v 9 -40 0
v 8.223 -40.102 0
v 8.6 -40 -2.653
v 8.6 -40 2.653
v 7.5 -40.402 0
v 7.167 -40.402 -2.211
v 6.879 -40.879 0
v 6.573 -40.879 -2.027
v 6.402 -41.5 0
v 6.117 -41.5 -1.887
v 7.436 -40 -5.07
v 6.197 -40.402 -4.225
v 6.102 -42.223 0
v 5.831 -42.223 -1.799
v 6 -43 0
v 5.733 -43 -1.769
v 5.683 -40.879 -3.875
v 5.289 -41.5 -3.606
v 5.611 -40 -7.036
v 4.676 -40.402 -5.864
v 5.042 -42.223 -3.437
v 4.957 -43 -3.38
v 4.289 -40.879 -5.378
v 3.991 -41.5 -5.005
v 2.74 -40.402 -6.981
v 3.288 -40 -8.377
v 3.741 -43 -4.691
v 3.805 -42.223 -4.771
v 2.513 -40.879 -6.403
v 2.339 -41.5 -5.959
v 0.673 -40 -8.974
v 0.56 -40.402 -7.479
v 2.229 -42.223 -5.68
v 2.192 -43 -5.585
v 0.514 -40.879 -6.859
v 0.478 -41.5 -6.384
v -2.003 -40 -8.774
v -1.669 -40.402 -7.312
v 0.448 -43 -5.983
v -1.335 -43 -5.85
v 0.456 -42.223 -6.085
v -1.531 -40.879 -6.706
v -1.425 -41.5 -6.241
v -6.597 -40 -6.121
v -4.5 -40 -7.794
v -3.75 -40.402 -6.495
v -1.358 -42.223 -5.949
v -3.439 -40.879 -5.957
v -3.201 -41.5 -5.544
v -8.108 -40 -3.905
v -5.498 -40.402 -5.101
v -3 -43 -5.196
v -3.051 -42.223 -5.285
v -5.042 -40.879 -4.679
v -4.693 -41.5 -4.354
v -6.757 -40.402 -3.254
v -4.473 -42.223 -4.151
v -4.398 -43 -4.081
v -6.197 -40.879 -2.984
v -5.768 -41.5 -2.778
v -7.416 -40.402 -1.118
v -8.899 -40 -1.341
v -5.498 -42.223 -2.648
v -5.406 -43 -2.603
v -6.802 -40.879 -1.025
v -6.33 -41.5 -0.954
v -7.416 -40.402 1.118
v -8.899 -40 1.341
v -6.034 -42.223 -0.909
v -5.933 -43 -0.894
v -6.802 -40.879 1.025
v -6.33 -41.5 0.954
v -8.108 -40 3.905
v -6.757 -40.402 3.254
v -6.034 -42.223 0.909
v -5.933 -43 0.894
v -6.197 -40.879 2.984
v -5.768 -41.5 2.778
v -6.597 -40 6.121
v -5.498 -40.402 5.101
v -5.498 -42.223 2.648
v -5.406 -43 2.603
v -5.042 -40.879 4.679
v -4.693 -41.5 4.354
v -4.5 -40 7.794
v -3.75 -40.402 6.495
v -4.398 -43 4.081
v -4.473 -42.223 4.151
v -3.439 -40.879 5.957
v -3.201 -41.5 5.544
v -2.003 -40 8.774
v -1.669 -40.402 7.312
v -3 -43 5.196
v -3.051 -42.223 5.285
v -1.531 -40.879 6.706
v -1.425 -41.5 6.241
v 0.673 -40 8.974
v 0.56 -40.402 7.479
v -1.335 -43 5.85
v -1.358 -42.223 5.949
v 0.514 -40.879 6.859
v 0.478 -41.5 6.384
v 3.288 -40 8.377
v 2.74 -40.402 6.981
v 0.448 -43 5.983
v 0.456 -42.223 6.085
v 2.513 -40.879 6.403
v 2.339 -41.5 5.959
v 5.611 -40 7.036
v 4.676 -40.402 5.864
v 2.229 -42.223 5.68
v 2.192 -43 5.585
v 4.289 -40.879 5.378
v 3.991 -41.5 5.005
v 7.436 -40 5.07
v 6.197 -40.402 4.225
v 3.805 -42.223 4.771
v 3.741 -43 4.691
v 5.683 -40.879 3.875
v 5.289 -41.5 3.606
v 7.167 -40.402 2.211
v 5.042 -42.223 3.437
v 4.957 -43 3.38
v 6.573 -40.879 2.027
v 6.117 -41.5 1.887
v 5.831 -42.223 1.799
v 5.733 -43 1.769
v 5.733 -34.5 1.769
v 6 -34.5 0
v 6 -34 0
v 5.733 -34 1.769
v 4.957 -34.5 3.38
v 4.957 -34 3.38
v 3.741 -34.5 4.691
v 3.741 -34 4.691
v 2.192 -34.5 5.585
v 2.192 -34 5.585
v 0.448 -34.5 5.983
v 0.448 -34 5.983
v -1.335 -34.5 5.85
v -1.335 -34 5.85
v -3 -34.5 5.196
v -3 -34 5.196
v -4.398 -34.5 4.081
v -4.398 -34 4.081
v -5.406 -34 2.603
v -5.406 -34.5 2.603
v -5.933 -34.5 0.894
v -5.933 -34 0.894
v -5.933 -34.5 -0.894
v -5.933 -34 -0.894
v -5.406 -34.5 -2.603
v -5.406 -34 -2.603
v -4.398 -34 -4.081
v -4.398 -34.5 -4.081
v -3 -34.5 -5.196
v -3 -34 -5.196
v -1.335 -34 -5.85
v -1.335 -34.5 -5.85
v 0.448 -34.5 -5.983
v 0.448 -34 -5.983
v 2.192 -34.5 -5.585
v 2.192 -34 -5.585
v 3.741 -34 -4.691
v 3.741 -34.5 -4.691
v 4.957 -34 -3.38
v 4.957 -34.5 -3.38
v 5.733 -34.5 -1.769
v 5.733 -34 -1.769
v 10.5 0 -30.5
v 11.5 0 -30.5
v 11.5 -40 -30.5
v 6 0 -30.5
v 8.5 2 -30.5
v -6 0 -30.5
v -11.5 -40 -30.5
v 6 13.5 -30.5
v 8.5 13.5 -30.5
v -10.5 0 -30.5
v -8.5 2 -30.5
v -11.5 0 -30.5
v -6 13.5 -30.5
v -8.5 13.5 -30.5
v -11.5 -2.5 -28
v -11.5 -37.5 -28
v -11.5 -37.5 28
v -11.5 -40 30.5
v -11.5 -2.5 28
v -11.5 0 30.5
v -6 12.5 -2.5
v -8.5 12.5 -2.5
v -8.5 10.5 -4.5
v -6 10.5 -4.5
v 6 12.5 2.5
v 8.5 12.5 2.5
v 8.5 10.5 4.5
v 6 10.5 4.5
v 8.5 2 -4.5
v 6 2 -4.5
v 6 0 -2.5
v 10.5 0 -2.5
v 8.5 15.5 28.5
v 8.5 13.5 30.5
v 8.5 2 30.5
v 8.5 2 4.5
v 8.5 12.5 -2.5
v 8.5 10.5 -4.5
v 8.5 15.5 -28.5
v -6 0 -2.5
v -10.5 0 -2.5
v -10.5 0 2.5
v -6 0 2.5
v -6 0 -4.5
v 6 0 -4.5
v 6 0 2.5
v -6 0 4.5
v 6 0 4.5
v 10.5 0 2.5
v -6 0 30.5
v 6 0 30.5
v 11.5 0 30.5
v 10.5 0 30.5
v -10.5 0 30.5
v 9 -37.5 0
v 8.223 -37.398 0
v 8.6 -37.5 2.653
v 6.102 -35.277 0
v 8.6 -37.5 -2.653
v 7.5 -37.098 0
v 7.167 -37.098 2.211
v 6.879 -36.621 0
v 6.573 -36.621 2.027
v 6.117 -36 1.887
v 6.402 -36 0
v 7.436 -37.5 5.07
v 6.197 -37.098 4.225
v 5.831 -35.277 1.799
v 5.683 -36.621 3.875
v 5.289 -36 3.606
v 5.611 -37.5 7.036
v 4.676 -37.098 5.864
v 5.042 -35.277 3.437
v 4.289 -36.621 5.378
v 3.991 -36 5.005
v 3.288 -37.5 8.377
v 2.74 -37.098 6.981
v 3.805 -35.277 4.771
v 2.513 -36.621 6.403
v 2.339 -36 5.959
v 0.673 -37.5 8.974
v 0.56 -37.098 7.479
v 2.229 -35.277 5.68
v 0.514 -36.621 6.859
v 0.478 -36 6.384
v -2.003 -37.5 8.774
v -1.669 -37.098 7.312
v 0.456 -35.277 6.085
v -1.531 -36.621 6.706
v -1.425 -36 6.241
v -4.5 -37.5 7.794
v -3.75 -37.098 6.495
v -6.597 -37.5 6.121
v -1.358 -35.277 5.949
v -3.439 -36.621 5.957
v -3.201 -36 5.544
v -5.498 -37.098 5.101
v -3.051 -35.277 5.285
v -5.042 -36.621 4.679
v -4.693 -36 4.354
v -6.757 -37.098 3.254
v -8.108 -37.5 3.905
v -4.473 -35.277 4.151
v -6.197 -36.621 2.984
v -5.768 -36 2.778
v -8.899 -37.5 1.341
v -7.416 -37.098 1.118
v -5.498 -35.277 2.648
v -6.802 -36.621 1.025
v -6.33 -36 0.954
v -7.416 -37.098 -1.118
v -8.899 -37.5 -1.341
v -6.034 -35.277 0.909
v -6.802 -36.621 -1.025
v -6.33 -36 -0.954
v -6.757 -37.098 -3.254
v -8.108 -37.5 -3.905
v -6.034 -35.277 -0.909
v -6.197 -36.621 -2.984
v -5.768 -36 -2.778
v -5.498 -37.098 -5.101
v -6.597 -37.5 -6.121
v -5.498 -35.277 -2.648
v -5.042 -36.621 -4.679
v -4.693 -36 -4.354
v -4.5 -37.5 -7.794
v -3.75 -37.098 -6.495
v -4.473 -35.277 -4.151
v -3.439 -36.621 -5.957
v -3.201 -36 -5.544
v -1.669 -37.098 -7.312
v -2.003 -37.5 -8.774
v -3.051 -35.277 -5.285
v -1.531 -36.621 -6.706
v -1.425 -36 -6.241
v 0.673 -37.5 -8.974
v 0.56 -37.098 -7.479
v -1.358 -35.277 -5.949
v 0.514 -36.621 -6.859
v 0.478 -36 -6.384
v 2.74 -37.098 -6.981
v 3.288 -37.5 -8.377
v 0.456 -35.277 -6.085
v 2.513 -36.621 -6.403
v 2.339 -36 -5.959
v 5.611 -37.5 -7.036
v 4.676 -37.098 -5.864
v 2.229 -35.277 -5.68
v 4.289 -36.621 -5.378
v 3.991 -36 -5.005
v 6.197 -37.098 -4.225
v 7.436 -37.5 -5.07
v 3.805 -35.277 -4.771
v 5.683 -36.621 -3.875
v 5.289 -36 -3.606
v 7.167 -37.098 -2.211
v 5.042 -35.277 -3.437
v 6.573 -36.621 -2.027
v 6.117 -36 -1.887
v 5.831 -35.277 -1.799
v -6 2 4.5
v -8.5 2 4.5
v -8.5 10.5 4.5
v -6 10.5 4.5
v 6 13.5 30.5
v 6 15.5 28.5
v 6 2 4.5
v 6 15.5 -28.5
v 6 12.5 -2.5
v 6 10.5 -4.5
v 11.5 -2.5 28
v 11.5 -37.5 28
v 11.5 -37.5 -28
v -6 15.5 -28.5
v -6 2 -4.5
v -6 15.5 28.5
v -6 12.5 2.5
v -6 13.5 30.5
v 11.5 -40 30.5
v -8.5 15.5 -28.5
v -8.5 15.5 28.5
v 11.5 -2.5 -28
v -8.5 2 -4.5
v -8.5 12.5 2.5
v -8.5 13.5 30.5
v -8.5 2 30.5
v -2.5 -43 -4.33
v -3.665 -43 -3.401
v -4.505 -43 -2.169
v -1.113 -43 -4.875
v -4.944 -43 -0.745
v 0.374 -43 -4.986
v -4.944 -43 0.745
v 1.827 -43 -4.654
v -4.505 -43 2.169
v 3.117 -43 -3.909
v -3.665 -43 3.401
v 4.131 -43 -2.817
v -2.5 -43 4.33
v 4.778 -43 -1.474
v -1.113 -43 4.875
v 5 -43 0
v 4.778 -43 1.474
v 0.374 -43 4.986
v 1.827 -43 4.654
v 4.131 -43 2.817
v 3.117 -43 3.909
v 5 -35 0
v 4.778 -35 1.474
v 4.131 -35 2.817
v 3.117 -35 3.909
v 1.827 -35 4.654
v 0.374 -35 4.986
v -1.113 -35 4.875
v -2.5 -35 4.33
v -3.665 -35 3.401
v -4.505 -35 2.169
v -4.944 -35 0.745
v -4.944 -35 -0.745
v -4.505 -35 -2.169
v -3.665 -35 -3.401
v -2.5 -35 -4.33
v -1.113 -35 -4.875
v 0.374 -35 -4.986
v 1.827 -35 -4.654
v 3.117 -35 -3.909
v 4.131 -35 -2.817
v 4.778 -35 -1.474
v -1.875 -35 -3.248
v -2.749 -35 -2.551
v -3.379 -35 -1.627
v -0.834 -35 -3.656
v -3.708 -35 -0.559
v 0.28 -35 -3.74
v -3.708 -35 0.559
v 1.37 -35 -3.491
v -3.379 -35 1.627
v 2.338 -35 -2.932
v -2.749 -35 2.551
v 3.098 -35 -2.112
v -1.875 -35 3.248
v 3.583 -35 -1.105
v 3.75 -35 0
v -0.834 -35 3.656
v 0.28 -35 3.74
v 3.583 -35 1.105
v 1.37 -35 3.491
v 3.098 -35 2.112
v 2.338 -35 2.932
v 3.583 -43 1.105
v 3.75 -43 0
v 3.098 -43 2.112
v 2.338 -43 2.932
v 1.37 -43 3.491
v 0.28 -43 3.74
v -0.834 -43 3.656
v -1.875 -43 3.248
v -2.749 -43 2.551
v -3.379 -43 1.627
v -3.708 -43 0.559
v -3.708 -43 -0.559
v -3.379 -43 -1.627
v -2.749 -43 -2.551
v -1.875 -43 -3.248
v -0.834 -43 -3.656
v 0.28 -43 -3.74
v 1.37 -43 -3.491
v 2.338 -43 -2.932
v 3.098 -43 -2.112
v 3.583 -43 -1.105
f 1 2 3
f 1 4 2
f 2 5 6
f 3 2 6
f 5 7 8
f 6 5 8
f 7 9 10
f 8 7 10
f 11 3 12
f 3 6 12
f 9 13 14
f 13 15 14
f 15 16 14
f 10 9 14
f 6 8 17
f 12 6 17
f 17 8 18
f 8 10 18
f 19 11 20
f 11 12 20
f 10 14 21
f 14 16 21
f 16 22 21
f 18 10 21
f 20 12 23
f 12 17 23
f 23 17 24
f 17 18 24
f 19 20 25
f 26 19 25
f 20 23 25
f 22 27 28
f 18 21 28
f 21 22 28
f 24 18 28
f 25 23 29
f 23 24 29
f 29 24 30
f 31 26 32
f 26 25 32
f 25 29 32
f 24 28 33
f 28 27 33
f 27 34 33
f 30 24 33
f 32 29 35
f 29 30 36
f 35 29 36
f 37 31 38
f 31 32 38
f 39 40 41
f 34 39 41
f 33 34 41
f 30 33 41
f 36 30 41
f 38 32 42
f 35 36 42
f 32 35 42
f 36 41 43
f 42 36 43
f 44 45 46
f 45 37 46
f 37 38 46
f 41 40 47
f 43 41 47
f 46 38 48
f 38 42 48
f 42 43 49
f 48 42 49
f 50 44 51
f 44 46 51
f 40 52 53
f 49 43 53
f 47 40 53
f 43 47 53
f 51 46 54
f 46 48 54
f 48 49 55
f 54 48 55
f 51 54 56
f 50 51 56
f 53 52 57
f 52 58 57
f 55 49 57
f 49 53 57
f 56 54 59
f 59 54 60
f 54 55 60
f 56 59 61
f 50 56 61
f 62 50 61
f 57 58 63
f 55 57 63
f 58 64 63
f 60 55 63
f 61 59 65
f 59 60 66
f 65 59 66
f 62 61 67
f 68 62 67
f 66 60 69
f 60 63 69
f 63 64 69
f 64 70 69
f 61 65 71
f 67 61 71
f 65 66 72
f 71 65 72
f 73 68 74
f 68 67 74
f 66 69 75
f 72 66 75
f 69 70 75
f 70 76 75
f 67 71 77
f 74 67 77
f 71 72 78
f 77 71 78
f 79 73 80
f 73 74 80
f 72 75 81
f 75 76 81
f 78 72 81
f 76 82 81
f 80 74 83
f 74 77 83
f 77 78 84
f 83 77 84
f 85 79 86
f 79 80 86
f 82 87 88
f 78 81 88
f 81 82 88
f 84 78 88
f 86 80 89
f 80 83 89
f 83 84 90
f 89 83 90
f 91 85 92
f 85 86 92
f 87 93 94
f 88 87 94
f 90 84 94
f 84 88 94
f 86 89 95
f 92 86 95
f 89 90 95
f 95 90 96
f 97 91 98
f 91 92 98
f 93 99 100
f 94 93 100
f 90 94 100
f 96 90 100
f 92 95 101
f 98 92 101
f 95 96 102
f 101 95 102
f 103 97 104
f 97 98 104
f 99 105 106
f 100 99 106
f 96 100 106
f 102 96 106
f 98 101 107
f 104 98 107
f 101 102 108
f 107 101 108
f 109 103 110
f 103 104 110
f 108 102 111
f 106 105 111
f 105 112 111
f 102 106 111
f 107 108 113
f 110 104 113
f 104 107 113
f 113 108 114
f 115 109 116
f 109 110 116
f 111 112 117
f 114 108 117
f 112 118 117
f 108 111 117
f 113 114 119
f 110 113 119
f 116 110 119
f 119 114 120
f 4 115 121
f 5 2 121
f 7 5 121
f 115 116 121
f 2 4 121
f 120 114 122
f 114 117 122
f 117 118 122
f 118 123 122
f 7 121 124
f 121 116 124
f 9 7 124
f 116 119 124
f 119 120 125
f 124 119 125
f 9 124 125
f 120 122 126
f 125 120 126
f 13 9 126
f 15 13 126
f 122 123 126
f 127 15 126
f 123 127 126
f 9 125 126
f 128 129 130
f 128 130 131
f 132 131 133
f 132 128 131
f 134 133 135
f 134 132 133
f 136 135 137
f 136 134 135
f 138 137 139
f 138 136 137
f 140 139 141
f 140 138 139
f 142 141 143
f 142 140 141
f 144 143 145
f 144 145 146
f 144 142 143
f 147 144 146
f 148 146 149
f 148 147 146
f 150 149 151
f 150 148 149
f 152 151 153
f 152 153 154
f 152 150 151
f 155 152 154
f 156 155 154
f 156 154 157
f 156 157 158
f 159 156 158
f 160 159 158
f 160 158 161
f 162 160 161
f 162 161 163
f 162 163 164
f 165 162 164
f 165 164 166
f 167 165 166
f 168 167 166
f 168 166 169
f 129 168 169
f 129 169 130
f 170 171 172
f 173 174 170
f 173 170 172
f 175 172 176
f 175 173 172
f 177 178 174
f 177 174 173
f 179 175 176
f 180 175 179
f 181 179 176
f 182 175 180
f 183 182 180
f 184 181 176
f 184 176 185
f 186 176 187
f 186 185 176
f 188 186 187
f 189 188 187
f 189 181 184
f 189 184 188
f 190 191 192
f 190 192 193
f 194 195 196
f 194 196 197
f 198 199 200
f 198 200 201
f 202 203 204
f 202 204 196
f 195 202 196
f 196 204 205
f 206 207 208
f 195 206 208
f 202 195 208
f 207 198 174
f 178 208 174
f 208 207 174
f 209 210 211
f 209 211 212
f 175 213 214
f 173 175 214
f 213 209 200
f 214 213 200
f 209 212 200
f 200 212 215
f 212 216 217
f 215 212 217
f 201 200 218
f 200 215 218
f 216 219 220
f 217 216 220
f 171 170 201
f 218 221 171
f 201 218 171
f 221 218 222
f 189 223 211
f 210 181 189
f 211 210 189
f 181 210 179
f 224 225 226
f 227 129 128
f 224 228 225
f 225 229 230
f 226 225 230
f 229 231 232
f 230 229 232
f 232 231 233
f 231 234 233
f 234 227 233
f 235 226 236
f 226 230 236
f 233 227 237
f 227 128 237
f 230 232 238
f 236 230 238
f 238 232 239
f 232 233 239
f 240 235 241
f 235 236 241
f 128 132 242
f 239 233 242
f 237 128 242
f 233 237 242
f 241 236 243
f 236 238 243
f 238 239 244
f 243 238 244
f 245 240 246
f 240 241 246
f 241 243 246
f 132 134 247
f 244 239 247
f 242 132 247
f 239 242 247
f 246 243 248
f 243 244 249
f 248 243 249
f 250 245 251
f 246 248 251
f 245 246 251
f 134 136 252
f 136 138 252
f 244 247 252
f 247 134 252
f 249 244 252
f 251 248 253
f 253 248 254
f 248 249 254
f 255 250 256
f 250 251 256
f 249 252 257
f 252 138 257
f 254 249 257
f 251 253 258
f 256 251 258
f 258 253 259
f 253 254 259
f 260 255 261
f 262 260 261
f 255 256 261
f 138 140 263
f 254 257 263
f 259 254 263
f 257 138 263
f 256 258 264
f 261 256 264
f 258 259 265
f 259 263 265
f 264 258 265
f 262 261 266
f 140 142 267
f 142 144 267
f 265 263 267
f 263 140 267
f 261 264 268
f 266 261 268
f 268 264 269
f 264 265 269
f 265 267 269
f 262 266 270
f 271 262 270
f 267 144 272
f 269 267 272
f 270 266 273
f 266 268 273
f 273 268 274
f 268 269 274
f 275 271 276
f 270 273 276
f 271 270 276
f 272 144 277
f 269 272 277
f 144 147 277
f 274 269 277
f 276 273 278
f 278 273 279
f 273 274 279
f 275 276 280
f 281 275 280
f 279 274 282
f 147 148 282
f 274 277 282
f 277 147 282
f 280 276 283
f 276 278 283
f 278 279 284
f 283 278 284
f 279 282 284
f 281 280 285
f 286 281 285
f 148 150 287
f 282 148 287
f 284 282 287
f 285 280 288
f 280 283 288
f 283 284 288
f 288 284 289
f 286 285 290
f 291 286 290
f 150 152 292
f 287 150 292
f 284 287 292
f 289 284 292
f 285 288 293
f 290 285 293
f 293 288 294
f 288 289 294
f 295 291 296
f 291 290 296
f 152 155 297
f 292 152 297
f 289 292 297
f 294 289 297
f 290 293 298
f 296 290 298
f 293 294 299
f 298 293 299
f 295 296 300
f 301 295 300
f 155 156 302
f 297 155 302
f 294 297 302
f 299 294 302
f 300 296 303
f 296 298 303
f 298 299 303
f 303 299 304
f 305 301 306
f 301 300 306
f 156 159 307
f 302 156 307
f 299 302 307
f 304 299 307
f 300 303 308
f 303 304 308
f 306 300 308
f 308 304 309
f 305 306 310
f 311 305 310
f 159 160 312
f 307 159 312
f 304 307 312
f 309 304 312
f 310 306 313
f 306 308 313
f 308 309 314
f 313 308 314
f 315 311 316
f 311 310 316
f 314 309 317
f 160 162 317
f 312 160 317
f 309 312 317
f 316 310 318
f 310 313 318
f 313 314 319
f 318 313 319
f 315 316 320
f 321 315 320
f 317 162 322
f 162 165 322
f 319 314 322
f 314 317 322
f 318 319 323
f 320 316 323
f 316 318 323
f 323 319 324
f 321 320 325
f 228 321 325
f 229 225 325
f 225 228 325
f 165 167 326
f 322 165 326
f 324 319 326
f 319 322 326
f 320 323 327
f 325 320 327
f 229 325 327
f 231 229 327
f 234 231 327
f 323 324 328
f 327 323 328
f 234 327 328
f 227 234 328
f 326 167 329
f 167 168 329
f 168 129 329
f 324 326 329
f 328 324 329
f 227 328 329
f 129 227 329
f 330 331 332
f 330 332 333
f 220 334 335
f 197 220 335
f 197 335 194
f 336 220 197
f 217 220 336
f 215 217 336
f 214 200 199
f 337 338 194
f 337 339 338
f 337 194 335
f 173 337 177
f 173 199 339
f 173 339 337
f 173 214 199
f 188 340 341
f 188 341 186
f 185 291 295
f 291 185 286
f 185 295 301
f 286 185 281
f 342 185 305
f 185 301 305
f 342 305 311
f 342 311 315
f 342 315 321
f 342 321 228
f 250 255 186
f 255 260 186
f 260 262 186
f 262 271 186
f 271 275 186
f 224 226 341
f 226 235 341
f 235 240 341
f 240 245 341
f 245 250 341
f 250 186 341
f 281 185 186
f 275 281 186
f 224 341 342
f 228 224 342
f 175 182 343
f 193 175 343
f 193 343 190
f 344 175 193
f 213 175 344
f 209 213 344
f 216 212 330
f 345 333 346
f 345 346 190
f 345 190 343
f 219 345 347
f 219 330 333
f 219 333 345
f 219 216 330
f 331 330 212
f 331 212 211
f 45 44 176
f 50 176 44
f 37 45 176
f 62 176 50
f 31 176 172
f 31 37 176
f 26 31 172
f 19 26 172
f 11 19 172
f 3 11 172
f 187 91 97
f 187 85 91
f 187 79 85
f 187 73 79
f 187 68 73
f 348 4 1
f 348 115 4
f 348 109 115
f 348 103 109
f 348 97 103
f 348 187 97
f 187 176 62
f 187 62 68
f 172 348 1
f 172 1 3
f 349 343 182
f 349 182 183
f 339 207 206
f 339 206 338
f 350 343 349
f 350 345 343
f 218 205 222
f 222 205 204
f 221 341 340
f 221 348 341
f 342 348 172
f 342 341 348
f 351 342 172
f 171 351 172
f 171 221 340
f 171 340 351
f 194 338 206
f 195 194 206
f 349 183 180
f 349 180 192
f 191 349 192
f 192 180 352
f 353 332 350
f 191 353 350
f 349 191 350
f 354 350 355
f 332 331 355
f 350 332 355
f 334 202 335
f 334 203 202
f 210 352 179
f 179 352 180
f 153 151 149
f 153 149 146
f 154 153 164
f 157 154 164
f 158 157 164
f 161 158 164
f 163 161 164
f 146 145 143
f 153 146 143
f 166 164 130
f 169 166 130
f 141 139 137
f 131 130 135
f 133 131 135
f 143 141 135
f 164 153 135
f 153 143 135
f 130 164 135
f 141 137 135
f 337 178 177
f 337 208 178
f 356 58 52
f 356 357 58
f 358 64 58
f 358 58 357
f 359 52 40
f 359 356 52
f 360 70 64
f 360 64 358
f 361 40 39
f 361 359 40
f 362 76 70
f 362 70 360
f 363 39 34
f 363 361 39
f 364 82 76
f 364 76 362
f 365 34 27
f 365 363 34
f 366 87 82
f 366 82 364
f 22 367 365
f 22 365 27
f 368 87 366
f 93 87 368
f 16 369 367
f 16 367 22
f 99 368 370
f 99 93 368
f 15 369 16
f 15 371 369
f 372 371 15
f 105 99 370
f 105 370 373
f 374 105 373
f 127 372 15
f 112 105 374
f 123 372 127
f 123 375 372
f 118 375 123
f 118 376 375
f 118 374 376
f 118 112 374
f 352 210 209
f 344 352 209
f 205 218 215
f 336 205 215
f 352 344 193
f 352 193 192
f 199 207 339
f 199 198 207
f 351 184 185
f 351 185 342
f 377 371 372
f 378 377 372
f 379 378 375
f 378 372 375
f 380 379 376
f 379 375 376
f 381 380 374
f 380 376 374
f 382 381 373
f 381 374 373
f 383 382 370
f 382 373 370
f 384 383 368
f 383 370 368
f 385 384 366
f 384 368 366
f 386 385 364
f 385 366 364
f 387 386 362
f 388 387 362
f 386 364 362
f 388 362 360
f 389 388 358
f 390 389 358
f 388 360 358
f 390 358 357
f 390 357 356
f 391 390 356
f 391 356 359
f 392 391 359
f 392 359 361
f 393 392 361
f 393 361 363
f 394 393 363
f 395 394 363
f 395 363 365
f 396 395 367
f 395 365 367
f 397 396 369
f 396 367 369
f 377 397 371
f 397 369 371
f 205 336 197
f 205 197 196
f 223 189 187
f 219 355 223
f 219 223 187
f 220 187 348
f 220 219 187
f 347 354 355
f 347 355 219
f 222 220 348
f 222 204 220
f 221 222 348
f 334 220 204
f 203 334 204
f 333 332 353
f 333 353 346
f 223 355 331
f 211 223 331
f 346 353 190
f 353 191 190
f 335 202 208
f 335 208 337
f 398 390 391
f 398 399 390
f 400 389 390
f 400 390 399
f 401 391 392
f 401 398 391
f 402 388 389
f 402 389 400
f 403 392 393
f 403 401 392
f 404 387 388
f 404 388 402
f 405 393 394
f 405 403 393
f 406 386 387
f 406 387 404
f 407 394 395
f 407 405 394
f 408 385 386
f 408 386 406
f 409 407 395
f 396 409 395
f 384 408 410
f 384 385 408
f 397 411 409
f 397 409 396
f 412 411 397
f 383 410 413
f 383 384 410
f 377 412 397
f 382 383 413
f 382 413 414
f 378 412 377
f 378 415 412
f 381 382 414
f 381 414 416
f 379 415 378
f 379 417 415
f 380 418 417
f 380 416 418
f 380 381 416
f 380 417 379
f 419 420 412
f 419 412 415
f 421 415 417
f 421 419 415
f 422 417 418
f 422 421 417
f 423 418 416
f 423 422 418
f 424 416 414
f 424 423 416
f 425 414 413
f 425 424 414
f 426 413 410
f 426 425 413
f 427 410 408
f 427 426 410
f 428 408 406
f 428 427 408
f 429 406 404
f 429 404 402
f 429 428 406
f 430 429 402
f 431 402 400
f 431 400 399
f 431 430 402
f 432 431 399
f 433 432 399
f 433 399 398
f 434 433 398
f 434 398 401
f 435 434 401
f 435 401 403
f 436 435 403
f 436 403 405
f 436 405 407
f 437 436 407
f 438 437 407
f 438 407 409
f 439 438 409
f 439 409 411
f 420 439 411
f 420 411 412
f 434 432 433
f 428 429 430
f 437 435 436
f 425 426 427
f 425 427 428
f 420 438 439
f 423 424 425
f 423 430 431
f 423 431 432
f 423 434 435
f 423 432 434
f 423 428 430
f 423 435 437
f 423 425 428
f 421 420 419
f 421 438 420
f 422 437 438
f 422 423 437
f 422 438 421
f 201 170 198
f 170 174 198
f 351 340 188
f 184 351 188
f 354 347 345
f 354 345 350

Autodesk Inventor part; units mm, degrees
ref_plane "YZ Plane" through (0, 0, 0) normal (1, 0, 0) x (0, 1, 0)
ref_plane "XZ Plane" through (0, 0, 0) normal (0, 1, 0) x (-1, 0, 0)
ref_plane "XY Plane" through (0, 0, 0) normal (0, 0, 1) x (1, 0, 0)
sketch "Sketch1" plane through (0, 0, 0) normal (0, 1, 0) x (-1, 0, 0)
  line L0 (6, 30.5) -> (-6, 30.5)
  line L1 (-6, 30.5) -> (-6, -30.5)
  line L2 (-6, -30.5) -> (6, -30.5)
  line L3 (6, -30.5) -> (6, 30.5)
  line L4 (8.5, 30.5) -> (-8.5, 30.5)
  line L5 (-8.5, 30.5) -> (-8.5, -30.5)
  line L6 (-8.5, -30.5) -> (8.5, -30.5)
  line L7 (8.5, -30.5) -> (8.5, 30.5)
  point P0 (0, 0)
  point P1 (-6, 30.5)
  dimension "d0" = 61
  dimension "d1" = 30.5
  dimension "d2" = 0
  dimension "d3" = 0
  dimension "d4" = 2.5
  dimension "d5" = 2.5
  dimension "d6" = 12
  dimension "d7" = 6
extrude "Extrusion1" add sketch "Sketch1" along normal blind 15.5 contours L4 L7 L6 L3 | L1 L6 L5 L4
sketch "Sketch2" plane through (0, 0, 0) normal (0, 1, 0) x (-1, 0, 0)
  line L0 (-11.5, 28) -> (11.5, 28)
  line L1 (11.5, 28) -> (11.5, -28)
  line L2 (11.5, -28) -> (-11.5, -28)
  line L3 (-11.5, -28) -> (-11.5, 28)
  line L4 (-8.5, 30.5) -> (-8.5, -30.5) projected
  line L5 (8.5, -30.5) -> (8.5, 30.5) projected
  point P0 (0, 0)
  dimension "d10" = 56
  dimension "d11" = 28
  dimension "d12" = 3
  dimension "d13" = 3
extrude "Extrusion2" add sketch "Sketch2" against normal blind 2.5
sketch "Sketch3" plane through (0, -2.5, 0) normal (0, -1, 0) x (1, 0, 0)
  line L0 (11.5, -30.5) -> (-11.5, -30.5)
  line L1 (-11.5, -30.5) -> (-11.5, 30.5)
  line L2 (-11.5, 30.5) -> (11.5, 30.5)
  line L3 (11.5, 30.5) -> (11.5, -30.5)
  line L4 (11.5, -28) -> (11.5, 28) projected
  line L5 (-11.5, 28) -> (-11.5, -28) projected
  line L6 (-11.5, -28) -> (11.5, -28) projected
  line L7 (11.5, 28) -> (-11.5, 28) projected
  point P0 (0, 0)
  point P1 (11.5, -28)
  point P2 (-11.5, -28)
  point P3 (-11.5, 28)
  point P4 (11.5, 28)
  dimension "d16" = 0
  dimension "d17" = 0
  dimension "d18" = 2.5
  dimension "d19" = 2.5
extrude "Extrusion3" add sketch "Sketch3" along normal blind 35 and the other way blind 2.5 contours L0 L1 L6 L3 | L7 L1 L2 L3
sketch "Sketch4" plane through (0, -37.5, 0) normal (0, -1, 0) x (1, 0, 0)
  line L0 (11.5, 30.5) -> (11.5, -30.5) projected
  line L1 (-11.5, -30.5) -> (-11.5, 30.5) projected
  line L2 (11.5, -30.5) -> (-11.5, -30.5)
  line L3 (-11.5, -30.5) -> (-11.5, 30.5)
  line L4 (-11.5, 30.5) -> (11.5, 30.5)
  line L5 (11.5, 30.5) -> (11.5, -30.5)
  point P0 (0, 0)
  point P1 (-11.5, -30.5)
extrude "Extrusion4" add sketch "Sketch4" along normal blind 2.5
sketch "Sketch5" plane through (0, -40, 0) normal (0, -1, 0) x (1, 0, 0)
  circle A0 centre (0, 0) radius 6
  dimension "d26" = 12
extrude "Extrusion5" add sketch "Sketch5" along normal blind 3 and the other way blind 6
sketch "Sketch6" plane through (0, -43, 0) normal (0, -1, 0) x (1, 0, 0)
  circle A0 centre (0, 0) radius 3.75
  circle A1 centre (0, 0) radius 5
  dimension "d31" = 7.5
  dimension "d32" = 10
extrude "Extrusion6" cut sketch "Sketch6" against normal blind 8
sketch "Sketch7" plane through (0, 0, 0) normal (0, 1, 0) x (1, 0, 0)
  line L0 (-11.5, -4.5) -> (12.0053, -4.5)
  line L1 (12.0053, -4.5) -> (12.0053, 4.5)
  line L2 (12.0053, 4.5) -> (-11.5, 4.5)
  line L3 (-11.5, 4.5) -> (-11.5, -4.5)
  line L4 (-11.5, 28) -> (-11.5, -28) projected
  point P0 (0, 0)
  point P1 (-12, 31)
  point P2 (-12, -31)
  dimension "d35" = 0
  dimension "d36" = 9
  dimension "d37" = 4.5
extrude "Extrusion7" cut sketch "Sketch7" along normal blind 12.5
chamfer "Chamfer1" distance 2 angle 45 12 edges at (-7.25, 12.5, 4.5) (-7.25, 0, 4.5) (7.25, 0, 4.5) (7.25, 12.5, -4.5) (7.25, 12.5, 4.5) (-7.25, 12.5, -4.5) (7.25, 0, -4.5) (-7.25, 0, -4.5) (8.5, 0, 17.5) (8.5, 0, -17.5) (-8.5, 0, -17.5) (-8.5, 0, 17.5)
chamfer "Chamfer2" distance 2 angle 45 4 edges at (-7.25, 15.5, 30.5) (7.25, 15.5, 30.5) (-7.25, 15.5, -30.5) (7.25, 15.5, -30.5)
fillet "Fillet1" radius 3 2 edges at (-6, -40, 0) (-6, -37.5, 0)
sketch "Sketch10" plane through (11.5, 0, 30.5) normal (1, 0, 0) x (0, 0, -1)
  line L0 (0, 0) -> (0, -40) projected
  line L1 (2.5, -37.5) -> (2.5, -2.5) projected
  line L2 (0, -40) -> (2.5, -37.5)
  line L3 (58.5, -2.5) -> (58.5, -37.5) projected
  line L4 (2.5, -37.5) -> (58.5, -2.5)
  line L5 (61, 0) -> (61, -40) projected
  line L6 (58.5, -2.5) -> (61, 0)
  line L7 (61, 0) -> (69.672, -53.3691)
  line L8 (69.672, -53.3691) -> (66.4417, -53.894)
  line L9 (66.4417, -53.894) -> (0, -40)
  line L10 (0, -40) -> (-4.0587, 20.5845)
  line L11 (-4.0587, 20.5845) -> (67.1806, 19.3093)
  arc A0 (67.1806, 19.3093) -> (69.2094, 15.0199) centre (72.5272, 19.2136) ccw
  line L12 (61, 0) -> (33, 0) projected
  line L13 (69.2094, 15.0199) -> (61, 0)
  point P0 (30.5, 0)
properties part number "Koszyk_v2"
